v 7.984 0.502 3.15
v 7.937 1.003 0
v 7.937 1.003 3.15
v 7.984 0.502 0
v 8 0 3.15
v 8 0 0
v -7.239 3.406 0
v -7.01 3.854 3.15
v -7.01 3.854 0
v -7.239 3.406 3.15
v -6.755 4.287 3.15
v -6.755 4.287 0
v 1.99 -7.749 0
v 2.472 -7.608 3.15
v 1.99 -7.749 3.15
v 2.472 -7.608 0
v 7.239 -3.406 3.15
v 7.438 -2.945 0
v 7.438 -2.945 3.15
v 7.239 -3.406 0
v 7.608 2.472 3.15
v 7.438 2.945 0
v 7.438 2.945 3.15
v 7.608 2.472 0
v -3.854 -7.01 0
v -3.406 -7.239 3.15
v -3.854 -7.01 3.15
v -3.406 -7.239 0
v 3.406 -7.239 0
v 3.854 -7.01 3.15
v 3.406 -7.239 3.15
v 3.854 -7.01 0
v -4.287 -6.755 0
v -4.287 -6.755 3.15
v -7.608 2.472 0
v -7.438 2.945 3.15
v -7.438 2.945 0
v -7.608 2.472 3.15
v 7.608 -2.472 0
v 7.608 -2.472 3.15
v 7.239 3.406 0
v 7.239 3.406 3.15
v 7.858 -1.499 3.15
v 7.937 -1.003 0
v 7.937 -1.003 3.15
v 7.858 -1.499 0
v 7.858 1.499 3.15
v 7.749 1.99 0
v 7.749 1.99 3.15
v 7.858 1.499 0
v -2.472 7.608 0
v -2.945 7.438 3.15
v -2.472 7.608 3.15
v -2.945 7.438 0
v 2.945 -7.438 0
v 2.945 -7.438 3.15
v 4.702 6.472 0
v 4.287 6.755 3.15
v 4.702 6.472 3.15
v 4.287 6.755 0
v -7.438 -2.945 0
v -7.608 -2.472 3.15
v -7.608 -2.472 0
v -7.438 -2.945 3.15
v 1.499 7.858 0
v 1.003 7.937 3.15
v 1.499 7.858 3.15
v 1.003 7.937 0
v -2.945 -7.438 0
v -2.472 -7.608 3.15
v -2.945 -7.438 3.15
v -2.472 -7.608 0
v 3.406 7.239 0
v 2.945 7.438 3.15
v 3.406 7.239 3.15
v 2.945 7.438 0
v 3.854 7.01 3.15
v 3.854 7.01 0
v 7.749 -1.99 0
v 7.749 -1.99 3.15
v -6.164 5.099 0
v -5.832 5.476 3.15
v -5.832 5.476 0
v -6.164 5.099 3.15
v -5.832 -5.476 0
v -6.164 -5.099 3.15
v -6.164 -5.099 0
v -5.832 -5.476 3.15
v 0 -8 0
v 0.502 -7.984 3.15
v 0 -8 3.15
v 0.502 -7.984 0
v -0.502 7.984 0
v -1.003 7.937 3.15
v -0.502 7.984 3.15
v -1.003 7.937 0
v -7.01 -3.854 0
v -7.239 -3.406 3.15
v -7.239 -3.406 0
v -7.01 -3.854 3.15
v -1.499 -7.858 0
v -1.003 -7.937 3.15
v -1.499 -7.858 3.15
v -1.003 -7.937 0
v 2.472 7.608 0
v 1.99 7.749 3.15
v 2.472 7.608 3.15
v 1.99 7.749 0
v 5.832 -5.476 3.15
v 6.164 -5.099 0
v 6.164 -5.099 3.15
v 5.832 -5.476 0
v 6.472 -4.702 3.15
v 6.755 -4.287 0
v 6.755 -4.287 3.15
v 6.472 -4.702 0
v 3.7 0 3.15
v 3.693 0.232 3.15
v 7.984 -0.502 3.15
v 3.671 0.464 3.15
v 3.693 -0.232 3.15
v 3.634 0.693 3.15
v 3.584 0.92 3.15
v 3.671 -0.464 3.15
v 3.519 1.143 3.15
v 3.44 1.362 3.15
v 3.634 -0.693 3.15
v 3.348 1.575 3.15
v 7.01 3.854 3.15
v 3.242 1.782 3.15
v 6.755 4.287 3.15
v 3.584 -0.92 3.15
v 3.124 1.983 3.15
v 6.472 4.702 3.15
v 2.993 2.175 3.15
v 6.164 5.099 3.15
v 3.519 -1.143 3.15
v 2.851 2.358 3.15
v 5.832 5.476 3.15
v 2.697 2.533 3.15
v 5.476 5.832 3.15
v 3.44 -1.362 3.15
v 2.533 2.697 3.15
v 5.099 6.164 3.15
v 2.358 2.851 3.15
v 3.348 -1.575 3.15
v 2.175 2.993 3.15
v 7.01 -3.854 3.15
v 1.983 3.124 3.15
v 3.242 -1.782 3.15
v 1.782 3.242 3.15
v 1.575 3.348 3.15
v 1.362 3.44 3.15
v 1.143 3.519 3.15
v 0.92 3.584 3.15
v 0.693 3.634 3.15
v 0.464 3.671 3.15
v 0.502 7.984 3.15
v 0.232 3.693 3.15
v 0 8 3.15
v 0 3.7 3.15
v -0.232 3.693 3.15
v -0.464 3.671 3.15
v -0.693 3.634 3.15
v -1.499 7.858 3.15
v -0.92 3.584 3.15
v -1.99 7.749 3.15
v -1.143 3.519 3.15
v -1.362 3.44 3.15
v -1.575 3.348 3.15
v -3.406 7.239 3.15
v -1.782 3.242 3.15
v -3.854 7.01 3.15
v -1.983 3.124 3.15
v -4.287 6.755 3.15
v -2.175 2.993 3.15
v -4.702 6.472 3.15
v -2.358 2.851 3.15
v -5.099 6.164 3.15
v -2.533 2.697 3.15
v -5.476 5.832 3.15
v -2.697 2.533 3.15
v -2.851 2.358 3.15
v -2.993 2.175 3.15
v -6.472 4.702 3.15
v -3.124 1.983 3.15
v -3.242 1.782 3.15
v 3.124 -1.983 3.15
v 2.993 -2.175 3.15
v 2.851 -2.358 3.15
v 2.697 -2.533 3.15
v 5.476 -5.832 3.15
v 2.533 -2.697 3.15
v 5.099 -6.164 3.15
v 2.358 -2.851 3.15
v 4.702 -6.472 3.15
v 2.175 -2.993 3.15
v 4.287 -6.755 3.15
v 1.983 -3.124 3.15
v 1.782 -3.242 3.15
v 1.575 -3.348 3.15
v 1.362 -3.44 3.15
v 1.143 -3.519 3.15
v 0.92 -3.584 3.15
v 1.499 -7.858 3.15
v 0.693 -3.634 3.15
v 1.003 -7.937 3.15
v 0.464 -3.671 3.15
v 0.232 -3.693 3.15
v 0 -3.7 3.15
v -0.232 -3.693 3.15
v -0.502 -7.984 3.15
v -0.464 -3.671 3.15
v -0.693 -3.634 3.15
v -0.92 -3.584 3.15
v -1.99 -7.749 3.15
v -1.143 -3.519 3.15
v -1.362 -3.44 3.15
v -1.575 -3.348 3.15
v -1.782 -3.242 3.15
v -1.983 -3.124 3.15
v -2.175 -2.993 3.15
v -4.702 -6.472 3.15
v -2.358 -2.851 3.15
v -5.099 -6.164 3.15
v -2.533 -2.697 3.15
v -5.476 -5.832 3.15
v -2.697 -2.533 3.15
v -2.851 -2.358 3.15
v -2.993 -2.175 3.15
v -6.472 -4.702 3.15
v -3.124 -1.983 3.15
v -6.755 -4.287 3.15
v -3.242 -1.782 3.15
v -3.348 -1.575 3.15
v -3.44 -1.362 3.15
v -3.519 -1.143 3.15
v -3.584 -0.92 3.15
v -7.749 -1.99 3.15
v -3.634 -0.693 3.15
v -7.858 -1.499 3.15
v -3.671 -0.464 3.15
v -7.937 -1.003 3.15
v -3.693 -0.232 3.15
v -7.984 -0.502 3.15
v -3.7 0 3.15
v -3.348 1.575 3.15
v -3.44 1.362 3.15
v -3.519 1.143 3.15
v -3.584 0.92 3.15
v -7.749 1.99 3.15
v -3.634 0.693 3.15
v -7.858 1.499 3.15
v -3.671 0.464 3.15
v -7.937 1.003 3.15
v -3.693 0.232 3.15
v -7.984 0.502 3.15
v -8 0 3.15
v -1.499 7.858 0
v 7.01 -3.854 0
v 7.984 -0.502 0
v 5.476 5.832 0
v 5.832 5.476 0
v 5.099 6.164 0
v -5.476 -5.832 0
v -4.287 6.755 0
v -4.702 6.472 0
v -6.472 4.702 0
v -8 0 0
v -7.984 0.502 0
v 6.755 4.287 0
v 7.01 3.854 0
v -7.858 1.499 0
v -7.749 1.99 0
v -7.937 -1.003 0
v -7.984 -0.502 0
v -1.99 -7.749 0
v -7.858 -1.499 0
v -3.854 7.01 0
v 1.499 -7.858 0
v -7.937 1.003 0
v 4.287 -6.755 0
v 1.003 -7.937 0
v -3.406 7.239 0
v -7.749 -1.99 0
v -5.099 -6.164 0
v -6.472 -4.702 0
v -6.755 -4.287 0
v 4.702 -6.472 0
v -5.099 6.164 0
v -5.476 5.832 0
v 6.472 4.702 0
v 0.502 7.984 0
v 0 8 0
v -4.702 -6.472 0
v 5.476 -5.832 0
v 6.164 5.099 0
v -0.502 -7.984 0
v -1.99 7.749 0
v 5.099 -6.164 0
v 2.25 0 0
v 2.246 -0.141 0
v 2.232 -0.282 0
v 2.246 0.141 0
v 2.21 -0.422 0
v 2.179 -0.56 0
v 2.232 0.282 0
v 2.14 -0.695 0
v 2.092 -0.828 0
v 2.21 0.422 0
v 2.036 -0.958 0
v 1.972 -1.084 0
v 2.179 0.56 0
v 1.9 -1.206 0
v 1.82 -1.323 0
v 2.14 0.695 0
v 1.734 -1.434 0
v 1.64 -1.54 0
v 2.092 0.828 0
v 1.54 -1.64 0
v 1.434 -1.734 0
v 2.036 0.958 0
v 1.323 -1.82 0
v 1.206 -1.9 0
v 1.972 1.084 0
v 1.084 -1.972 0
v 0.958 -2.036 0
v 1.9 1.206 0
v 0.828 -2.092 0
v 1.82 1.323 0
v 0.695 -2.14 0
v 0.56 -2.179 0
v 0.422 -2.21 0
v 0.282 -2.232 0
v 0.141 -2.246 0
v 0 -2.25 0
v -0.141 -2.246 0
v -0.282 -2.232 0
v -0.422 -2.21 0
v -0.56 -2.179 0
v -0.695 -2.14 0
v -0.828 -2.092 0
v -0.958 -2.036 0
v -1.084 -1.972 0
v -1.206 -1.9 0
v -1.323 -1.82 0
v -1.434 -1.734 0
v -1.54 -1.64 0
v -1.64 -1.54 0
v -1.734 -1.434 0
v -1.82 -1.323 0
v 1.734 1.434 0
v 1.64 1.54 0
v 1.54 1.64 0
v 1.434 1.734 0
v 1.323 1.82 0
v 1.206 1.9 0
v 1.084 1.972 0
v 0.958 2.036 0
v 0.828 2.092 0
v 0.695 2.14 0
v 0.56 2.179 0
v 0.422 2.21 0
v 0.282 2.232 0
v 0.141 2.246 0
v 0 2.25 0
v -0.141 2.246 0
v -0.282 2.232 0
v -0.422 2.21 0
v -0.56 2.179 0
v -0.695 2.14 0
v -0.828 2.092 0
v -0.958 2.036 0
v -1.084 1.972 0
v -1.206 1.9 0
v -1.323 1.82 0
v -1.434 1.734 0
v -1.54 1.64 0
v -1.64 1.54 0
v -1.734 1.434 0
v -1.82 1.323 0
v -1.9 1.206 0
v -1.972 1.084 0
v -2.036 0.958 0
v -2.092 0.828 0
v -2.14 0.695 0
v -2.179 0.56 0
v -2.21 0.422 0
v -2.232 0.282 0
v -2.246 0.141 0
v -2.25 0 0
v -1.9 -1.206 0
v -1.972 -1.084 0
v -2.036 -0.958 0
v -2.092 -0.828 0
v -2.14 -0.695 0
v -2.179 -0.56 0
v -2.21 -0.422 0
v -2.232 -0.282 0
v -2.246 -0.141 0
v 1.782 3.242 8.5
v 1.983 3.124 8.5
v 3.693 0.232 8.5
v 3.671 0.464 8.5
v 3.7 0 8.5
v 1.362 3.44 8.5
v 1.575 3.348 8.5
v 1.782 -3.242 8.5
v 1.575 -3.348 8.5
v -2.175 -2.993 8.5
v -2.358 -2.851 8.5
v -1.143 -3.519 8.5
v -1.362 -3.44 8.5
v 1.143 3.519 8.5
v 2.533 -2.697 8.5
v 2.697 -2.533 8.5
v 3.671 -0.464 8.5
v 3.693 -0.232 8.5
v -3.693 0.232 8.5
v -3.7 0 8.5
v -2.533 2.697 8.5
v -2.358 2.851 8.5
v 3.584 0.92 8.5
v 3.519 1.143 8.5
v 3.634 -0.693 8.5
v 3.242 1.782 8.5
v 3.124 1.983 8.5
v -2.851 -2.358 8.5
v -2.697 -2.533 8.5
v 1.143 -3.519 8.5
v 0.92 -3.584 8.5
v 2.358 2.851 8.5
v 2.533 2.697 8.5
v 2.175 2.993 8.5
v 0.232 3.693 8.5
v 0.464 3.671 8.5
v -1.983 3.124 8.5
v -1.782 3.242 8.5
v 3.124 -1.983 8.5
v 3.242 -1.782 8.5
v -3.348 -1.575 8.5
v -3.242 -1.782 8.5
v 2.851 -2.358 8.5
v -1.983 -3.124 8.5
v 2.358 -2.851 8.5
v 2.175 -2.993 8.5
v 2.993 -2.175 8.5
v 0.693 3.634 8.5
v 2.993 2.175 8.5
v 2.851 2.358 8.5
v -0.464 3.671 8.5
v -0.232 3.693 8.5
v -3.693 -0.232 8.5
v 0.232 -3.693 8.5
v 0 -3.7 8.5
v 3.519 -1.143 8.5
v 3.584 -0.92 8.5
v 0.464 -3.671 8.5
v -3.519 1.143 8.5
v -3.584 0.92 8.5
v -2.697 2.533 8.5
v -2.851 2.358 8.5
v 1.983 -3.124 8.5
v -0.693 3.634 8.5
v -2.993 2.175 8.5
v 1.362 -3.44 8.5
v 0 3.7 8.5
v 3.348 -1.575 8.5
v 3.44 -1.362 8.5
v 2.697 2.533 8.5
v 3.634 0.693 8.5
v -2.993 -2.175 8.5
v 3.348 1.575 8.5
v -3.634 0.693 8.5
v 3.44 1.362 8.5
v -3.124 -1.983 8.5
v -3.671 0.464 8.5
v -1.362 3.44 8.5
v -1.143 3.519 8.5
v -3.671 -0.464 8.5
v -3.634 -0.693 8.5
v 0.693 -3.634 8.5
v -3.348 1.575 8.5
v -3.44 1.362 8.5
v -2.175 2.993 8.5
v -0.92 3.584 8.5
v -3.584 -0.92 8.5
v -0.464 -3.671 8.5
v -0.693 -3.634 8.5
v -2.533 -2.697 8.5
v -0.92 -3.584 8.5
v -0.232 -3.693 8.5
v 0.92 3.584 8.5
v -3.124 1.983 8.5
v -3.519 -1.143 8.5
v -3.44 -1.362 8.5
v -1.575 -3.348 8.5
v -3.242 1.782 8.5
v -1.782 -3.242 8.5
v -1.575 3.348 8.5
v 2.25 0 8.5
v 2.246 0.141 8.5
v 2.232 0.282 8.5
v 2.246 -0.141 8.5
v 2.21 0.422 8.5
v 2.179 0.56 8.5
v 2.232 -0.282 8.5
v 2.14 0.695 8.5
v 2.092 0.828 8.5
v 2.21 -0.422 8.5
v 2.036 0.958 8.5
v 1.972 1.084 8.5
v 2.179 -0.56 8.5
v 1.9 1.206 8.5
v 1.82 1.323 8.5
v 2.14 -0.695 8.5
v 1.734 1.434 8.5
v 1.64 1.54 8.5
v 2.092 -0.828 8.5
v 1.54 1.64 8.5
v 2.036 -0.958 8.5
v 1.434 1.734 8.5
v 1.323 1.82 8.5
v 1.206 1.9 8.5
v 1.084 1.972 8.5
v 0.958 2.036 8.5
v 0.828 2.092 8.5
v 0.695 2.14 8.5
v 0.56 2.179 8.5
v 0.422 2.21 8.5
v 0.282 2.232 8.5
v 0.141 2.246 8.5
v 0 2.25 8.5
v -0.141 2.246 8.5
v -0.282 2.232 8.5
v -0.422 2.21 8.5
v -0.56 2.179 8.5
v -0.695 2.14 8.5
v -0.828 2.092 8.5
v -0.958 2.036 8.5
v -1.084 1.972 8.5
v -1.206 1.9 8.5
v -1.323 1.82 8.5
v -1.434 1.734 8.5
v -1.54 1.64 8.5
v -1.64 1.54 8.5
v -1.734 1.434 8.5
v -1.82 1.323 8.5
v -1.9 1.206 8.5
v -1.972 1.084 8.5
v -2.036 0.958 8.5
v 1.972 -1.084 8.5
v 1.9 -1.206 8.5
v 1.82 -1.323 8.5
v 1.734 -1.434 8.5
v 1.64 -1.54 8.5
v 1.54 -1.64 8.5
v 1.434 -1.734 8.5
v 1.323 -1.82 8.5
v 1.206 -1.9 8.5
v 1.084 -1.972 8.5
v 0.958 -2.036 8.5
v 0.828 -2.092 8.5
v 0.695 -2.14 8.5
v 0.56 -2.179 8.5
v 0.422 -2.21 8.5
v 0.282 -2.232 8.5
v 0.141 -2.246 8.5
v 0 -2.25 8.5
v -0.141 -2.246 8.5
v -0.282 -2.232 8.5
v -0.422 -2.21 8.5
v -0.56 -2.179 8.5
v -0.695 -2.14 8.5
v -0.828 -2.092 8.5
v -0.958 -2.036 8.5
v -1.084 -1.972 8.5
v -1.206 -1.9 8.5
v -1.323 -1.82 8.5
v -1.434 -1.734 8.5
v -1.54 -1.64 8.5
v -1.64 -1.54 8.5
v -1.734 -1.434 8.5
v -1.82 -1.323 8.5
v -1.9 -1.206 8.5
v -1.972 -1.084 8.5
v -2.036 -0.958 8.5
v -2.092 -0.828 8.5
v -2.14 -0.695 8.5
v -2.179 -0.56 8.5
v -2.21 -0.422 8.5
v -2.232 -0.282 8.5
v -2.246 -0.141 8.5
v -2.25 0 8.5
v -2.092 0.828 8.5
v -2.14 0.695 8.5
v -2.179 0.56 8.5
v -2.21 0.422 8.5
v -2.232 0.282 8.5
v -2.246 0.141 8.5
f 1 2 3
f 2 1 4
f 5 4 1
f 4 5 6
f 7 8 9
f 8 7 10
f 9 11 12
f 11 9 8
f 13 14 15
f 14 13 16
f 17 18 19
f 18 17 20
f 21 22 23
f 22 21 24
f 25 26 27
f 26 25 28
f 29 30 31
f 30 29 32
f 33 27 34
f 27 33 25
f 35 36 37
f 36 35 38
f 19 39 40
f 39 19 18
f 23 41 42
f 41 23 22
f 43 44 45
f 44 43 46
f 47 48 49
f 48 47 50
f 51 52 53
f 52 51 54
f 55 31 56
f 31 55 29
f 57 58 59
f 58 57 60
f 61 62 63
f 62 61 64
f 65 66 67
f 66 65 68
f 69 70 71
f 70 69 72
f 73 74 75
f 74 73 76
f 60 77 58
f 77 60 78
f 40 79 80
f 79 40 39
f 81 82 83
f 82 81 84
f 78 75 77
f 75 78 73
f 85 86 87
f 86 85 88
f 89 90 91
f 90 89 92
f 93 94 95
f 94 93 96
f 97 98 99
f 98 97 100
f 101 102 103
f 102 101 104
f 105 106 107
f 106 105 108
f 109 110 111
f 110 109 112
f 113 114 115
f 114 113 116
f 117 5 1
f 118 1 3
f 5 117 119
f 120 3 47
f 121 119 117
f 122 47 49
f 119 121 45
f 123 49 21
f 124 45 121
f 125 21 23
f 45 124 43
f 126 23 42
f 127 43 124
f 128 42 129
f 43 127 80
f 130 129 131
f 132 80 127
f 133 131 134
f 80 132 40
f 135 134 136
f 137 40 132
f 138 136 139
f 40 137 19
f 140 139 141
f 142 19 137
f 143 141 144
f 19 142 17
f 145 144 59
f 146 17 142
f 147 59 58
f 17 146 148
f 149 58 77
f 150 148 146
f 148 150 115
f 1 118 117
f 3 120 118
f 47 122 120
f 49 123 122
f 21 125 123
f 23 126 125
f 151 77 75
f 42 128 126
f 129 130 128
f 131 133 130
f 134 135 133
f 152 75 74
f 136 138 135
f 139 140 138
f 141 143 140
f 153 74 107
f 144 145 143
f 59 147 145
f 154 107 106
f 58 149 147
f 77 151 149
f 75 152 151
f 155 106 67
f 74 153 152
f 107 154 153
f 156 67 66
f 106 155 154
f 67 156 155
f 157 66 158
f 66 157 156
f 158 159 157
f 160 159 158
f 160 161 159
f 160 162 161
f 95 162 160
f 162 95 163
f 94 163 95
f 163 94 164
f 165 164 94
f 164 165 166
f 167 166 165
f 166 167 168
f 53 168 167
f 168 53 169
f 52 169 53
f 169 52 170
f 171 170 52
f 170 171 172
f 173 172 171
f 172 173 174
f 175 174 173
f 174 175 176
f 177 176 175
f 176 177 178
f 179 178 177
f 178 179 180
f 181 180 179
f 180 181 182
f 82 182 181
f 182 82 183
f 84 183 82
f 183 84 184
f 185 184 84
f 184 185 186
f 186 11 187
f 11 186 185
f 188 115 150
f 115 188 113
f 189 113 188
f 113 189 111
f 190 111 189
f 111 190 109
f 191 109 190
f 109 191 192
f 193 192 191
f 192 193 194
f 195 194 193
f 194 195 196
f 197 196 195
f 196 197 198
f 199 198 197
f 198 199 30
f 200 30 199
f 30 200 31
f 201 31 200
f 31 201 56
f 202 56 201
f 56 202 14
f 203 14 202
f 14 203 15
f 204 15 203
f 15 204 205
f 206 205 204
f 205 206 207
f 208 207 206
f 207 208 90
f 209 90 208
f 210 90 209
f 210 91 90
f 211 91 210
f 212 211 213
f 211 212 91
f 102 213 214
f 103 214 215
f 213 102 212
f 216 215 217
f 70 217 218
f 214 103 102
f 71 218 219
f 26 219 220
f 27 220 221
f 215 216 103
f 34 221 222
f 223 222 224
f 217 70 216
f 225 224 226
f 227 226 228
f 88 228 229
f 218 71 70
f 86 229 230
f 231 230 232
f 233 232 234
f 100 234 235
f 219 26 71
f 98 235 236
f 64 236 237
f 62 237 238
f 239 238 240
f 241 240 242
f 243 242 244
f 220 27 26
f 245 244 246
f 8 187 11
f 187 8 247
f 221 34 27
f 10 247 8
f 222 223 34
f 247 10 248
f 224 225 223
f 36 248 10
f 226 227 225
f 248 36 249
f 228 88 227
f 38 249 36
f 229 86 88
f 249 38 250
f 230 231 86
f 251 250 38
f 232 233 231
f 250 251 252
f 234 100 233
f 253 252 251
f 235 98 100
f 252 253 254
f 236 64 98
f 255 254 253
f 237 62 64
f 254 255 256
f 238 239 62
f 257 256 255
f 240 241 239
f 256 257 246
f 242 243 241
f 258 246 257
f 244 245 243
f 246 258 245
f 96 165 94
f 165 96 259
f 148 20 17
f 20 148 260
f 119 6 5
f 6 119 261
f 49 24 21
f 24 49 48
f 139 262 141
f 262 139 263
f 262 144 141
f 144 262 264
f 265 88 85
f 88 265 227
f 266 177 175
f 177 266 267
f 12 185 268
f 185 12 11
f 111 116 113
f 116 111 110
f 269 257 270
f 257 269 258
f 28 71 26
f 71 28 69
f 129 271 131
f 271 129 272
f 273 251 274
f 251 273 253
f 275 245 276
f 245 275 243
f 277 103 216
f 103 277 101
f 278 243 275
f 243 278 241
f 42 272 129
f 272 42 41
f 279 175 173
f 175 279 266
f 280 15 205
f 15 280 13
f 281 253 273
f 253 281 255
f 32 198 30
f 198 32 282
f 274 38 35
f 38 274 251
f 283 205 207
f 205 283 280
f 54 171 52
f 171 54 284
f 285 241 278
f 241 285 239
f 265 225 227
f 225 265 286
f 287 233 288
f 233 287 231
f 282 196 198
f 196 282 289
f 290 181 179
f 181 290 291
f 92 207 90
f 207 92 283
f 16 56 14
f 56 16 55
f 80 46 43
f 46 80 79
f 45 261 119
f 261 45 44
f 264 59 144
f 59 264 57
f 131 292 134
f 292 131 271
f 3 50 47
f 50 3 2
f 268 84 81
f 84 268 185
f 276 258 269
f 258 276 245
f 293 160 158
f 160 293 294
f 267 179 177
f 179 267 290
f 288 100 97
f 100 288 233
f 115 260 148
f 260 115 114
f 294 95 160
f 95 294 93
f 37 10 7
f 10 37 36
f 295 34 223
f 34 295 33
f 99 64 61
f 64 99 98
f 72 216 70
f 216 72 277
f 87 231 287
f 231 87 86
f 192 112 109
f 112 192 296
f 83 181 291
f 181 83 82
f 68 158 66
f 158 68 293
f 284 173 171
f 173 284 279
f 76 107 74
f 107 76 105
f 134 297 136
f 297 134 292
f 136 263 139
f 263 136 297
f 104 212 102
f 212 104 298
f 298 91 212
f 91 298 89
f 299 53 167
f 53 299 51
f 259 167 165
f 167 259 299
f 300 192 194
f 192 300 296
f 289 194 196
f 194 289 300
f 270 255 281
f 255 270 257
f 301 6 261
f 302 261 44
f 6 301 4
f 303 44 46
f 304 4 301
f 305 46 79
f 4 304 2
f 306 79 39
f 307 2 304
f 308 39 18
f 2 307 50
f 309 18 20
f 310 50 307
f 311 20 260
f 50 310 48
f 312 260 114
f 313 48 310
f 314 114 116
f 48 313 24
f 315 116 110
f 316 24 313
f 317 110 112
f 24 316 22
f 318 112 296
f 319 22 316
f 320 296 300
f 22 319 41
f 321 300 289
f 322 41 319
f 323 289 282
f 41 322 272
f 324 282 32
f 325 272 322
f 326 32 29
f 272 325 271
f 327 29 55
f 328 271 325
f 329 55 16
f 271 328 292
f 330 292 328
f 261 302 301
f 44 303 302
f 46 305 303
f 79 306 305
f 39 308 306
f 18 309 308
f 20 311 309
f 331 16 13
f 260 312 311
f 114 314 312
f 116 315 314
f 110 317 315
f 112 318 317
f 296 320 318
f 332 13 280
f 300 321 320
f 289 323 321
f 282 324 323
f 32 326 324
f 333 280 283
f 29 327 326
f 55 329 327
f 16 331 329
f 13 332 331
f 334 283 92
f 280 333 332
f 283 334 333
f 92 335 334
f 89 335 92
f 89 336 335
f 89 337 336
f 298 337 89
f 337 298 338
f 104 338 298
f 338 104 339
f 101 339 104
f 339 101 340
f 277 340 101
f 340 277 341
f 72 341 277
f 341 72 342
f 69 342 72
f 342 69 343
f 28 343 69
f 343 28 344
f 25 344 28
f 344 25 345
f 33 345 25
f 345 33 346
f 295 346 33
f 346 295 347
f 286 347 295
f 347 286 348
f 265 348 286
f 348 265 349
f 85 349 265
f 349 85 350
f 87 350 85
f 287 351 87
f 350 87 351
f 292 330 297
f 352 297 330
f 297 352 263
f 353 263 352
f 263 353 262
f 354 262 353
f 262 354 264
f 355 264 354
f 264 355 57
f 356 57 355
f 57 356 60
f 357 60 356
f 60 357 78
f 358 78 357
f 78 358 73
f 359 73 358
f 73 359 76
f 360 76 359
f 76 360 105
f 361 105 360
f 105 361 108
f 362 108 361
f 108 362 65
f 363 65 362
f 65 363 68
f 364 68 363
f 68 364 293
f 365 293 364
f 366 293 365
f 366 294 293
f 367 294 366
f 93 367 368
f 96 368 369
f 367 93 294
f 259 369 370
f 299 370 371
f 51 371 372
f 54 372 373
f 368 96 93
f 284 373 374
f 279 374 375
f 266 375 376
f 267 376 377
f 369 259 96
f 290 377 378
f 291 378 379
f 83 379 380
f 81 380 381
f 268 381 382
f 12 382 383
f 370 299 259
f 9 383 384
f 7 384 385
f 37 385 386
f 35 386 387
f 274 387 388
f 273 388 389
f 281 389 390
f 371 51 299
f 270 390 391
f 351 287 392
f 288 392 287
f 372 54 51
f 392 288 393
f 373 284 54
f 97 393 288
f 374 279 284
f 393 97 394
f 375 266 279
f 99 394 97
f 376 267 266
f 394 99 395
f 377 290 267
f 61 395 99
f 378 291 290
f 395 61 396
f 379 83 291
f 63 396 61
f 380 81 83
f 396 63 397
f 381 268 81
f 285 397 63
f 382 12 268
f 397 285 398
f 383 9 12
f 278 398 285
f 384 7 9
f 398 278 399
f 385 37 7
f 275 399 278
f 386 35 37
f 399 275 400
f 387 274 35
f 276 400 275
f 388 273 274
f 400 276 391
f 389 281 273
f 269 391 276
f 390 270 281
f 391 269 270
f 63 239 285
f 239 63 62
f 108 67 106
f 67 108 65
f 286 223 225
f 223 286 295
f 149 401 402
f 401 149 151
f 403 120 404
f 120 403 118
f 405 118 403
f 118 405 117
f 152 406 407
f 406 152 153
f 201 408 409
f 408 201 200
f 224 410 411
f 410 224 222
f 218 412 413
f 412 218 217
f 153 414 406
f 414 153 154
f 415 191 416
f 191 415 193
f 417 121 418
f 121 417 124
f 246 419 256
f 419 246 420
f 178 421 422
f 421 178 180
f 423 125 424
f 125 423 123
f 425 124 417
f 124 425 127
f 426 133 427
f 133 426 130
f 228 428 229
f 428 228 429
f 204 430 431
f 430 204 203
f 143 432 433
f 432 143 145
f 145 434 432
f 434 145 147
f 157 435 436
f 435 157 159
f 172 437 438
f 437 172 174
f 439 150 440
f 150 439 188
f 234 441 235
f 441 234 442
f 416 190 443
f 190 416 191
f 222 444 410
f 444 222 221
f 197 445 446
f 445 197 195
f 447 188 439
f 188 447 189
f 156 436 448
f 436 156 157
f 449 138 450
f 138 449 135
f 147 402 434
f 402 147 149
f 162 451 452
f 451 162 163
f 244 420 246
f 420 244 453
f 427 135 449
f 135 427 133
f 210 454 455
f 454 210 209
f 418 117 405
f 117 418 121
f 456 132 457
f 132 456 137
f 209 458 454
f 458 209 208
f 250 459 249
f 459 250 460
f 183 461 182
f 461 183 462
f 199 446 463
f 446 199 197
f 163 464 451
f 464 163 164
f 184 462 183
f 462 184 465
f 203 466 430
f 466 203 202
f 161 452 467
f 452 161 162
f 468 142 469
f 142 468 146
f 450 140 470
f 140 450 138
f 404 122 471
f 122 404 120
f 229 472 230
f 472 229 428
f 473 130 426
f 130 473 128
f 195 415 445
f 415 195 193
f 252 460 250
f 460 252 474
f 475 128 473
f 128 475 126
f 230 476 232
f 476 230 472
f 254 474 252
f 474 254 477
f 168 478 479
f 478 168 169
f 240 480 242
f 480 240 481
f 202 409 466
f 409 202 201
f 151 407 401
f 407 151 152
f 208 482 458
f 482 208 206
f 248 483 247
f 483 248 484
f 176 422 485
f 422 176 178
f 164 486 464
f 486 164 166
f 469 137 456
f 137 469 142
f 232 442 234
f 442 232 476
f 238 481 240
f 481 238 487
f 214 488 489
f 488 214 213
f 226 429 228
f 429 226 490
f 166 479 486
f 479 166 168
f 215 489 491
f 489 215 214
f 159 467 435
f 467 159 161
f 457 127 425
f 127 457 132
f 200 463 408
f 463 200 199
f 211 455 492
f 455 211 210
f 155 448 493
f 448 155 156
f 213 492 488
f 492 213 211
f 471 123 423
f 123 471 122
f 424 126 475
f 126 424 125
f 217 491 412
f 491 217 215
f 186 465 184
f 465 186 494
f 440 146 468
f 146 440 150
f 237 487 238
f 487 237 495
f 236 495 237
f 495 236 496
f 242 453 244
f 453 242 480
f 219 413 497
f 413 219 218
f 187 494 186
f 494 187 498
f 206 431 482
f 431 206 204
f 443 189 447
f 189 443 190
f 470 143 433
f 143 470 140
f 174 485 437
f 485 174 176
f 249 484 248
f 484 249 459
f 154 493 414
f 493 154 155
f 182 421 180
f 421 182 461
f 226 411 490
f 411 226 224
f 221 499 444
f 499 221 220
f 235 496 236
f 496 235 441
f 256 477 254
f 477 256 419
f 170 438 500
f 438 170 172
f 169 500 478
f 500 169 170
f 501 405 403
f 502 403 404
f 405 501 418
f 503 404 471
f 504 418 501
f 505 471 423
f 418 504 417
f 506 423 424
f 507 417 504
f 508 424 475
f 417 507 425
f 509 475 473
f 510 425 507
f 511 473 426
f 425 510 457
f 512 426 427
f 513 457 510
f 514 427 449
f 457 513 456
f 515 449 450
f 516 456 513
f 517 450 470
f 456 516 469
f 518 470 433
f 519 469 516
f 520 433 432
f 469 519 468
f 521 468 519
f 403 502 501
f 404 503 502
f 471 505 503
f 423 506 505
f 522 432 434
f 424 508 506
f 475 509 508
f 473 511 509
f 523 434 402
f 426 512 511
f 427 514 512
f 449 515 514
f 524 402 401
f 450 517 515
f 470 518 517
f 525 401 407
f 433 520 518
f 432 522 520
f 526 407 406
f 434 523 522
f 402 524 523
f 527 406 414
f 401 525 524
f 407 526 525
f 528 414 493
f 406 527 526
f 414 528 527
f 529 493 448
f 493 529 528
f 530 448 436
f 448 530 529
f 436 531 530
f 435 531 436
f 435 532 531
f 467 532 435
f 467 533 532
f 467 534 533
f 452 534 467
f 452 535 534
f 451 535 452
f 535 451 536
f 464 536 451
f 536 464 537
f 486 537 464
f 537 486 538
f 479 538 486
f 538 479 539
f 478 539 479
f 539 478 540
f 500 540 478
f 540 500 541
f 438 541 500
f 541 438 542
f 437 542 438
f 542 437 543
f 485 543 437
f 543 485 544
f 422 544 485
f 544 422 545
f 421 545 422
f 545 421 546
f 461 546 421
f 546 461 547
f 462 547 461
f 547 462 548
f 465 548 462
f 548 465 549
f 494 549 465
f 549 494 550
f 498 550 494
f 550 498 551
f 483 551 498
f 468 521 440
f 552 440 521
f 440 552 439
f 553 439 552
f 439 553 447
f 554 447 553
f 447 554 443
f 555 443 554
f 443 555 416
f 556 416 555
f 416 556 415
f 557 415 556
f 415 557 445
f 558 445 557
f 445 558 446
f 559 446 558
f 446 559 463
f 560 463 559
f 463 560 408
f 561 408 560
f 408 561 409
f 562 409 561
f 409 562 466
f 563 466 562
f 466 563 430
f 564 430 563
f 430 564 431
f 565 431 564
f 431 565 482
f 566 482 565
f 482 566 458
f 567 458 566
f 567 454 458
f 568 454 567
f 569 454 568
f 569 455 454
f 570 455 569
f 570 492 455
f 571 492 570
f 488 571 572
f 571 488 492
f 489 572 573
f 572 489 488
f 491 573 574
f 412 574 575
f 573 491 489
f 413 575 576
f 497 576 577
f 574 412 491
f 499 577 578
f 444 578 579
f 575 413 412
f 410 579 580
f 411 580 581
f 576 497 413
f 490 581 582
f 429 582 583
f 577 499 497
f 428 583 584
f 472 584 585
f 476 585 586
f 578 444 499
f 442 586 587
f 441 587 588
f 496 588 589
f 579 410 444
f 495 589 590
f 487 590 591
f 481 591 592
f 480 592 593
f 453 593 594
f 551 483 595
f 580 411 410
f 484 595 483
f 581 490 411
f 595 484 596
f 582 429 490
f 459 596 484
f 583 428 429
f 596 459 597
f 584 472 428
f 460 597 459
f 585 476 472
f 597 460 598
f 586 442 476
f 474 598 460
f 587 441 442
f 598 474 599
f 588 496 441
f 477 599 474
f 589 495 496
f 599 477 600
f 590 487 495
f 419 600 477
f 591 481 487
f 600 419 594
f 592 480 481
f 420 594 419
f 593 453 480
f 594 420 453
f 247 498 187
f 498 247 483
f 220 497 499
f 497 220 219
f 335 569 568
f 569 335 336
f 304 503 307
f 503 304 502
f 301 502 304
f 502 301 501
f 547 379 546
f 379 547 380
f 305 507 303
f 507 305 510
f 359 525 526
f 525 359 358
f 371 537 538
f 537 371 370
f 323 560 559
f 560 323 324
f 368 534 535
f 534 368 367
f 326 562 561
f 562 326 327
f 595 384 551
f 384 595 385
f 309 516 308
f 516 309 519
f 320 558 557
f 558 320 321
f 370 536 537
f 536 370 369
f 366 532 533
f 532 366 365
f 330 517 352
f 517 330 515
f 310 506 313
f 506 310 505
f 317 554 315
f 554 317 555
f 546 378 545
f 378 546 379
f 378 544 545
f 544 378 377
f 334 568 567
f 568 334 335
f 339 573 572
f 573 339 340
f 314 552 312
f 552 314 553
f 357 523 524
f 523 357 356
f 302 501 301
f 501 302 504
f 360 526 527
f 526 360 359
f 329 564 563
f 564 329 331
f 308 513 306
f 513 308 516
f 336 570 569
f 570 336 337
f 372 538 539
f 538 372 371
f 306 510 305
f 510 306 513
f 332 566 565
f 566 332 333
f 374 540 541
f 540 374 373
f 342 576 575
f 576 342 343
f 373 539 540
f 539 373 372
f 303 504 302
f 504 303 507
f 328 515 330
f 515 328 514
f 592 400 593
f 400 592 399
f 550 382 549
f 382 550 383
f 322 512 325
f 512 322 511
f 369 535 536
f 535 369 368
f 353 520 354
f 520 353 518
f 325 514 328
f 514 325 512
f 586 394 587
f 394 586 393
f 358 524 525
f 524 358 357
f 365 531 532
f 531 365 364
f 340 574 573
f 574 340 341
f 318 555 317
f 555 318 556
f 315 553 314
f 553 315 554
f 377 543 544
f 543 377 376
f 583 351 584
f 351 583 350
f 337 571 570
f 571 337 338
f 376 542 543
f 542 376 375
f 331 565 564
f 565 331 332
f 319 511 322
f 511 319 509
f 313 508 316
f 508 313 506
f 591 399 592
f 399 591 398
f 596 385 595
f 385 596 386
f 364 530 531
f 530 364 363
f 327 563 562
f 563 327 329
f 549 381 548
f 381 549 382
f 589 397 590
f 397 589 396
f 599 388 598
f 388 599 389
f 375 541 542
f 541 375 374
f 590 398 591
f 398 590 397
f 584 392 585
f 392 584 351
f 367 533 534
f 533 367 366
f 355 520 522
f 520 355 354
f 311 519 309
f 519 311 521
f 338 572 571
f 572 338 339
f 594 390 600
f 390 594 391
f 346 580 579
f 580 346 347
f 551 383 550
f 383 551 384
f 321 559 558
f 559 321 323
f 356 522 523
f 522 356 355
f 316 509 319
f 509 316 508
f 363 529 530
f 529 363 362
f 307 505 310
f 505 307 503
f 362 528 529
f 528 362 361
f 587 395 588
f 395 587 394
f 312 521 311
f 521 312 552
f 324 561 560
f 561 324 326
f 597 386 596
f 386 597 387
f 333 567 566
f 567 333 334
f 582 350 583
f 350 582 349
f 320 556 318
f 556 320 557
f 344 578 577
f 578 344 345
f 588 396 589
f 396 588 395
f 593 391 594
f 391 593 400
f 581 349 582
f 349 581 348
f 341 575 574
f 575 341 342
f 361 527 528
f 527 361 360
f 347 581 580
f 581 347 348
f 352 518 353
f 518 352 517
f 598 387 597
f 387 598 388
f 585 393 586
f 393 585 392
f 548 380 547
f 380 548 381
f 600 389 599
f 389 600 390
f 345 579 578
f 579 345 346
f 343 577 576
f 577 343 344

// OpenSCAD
/****************************************************************
* title: 1515 rail button
* author: Boris du Reau
* version: 1.0
* date: 13/06/2026
* 
* Description: 
* Howto use it:
*  Compil buttonPart1 and buttonPart2 and export them as STL
* 
* Note that all units are metrics
*****************************************************************/
resolution = 100;

module buttonPart1() {
    difference() {
        union() {
            cylinder(r = 16 / 2, h = 3.15, $fn = resolution);
            cylinder(r = 7.4 / 2, h = 8.5, $fn = resolution);
        }
        cylinder(r = 4.5 / 2, h = 8.5, $fn = resolution);

    }
}


module buttonPart2() {
    difference() {
        cylinder(r = 16 / 2, h = 3.15, $fn = resolution);
        cylinder(r = 4.5 / 2, h = 8.5, $fn = resolution);
        translate([0, 0, 0]) cylinder(r1 = 4.5 / 2, r2 = 8 / 2, h = 3.15, $fn = resolution);
    }
}

buttonPart1();
//buttonPart2();
